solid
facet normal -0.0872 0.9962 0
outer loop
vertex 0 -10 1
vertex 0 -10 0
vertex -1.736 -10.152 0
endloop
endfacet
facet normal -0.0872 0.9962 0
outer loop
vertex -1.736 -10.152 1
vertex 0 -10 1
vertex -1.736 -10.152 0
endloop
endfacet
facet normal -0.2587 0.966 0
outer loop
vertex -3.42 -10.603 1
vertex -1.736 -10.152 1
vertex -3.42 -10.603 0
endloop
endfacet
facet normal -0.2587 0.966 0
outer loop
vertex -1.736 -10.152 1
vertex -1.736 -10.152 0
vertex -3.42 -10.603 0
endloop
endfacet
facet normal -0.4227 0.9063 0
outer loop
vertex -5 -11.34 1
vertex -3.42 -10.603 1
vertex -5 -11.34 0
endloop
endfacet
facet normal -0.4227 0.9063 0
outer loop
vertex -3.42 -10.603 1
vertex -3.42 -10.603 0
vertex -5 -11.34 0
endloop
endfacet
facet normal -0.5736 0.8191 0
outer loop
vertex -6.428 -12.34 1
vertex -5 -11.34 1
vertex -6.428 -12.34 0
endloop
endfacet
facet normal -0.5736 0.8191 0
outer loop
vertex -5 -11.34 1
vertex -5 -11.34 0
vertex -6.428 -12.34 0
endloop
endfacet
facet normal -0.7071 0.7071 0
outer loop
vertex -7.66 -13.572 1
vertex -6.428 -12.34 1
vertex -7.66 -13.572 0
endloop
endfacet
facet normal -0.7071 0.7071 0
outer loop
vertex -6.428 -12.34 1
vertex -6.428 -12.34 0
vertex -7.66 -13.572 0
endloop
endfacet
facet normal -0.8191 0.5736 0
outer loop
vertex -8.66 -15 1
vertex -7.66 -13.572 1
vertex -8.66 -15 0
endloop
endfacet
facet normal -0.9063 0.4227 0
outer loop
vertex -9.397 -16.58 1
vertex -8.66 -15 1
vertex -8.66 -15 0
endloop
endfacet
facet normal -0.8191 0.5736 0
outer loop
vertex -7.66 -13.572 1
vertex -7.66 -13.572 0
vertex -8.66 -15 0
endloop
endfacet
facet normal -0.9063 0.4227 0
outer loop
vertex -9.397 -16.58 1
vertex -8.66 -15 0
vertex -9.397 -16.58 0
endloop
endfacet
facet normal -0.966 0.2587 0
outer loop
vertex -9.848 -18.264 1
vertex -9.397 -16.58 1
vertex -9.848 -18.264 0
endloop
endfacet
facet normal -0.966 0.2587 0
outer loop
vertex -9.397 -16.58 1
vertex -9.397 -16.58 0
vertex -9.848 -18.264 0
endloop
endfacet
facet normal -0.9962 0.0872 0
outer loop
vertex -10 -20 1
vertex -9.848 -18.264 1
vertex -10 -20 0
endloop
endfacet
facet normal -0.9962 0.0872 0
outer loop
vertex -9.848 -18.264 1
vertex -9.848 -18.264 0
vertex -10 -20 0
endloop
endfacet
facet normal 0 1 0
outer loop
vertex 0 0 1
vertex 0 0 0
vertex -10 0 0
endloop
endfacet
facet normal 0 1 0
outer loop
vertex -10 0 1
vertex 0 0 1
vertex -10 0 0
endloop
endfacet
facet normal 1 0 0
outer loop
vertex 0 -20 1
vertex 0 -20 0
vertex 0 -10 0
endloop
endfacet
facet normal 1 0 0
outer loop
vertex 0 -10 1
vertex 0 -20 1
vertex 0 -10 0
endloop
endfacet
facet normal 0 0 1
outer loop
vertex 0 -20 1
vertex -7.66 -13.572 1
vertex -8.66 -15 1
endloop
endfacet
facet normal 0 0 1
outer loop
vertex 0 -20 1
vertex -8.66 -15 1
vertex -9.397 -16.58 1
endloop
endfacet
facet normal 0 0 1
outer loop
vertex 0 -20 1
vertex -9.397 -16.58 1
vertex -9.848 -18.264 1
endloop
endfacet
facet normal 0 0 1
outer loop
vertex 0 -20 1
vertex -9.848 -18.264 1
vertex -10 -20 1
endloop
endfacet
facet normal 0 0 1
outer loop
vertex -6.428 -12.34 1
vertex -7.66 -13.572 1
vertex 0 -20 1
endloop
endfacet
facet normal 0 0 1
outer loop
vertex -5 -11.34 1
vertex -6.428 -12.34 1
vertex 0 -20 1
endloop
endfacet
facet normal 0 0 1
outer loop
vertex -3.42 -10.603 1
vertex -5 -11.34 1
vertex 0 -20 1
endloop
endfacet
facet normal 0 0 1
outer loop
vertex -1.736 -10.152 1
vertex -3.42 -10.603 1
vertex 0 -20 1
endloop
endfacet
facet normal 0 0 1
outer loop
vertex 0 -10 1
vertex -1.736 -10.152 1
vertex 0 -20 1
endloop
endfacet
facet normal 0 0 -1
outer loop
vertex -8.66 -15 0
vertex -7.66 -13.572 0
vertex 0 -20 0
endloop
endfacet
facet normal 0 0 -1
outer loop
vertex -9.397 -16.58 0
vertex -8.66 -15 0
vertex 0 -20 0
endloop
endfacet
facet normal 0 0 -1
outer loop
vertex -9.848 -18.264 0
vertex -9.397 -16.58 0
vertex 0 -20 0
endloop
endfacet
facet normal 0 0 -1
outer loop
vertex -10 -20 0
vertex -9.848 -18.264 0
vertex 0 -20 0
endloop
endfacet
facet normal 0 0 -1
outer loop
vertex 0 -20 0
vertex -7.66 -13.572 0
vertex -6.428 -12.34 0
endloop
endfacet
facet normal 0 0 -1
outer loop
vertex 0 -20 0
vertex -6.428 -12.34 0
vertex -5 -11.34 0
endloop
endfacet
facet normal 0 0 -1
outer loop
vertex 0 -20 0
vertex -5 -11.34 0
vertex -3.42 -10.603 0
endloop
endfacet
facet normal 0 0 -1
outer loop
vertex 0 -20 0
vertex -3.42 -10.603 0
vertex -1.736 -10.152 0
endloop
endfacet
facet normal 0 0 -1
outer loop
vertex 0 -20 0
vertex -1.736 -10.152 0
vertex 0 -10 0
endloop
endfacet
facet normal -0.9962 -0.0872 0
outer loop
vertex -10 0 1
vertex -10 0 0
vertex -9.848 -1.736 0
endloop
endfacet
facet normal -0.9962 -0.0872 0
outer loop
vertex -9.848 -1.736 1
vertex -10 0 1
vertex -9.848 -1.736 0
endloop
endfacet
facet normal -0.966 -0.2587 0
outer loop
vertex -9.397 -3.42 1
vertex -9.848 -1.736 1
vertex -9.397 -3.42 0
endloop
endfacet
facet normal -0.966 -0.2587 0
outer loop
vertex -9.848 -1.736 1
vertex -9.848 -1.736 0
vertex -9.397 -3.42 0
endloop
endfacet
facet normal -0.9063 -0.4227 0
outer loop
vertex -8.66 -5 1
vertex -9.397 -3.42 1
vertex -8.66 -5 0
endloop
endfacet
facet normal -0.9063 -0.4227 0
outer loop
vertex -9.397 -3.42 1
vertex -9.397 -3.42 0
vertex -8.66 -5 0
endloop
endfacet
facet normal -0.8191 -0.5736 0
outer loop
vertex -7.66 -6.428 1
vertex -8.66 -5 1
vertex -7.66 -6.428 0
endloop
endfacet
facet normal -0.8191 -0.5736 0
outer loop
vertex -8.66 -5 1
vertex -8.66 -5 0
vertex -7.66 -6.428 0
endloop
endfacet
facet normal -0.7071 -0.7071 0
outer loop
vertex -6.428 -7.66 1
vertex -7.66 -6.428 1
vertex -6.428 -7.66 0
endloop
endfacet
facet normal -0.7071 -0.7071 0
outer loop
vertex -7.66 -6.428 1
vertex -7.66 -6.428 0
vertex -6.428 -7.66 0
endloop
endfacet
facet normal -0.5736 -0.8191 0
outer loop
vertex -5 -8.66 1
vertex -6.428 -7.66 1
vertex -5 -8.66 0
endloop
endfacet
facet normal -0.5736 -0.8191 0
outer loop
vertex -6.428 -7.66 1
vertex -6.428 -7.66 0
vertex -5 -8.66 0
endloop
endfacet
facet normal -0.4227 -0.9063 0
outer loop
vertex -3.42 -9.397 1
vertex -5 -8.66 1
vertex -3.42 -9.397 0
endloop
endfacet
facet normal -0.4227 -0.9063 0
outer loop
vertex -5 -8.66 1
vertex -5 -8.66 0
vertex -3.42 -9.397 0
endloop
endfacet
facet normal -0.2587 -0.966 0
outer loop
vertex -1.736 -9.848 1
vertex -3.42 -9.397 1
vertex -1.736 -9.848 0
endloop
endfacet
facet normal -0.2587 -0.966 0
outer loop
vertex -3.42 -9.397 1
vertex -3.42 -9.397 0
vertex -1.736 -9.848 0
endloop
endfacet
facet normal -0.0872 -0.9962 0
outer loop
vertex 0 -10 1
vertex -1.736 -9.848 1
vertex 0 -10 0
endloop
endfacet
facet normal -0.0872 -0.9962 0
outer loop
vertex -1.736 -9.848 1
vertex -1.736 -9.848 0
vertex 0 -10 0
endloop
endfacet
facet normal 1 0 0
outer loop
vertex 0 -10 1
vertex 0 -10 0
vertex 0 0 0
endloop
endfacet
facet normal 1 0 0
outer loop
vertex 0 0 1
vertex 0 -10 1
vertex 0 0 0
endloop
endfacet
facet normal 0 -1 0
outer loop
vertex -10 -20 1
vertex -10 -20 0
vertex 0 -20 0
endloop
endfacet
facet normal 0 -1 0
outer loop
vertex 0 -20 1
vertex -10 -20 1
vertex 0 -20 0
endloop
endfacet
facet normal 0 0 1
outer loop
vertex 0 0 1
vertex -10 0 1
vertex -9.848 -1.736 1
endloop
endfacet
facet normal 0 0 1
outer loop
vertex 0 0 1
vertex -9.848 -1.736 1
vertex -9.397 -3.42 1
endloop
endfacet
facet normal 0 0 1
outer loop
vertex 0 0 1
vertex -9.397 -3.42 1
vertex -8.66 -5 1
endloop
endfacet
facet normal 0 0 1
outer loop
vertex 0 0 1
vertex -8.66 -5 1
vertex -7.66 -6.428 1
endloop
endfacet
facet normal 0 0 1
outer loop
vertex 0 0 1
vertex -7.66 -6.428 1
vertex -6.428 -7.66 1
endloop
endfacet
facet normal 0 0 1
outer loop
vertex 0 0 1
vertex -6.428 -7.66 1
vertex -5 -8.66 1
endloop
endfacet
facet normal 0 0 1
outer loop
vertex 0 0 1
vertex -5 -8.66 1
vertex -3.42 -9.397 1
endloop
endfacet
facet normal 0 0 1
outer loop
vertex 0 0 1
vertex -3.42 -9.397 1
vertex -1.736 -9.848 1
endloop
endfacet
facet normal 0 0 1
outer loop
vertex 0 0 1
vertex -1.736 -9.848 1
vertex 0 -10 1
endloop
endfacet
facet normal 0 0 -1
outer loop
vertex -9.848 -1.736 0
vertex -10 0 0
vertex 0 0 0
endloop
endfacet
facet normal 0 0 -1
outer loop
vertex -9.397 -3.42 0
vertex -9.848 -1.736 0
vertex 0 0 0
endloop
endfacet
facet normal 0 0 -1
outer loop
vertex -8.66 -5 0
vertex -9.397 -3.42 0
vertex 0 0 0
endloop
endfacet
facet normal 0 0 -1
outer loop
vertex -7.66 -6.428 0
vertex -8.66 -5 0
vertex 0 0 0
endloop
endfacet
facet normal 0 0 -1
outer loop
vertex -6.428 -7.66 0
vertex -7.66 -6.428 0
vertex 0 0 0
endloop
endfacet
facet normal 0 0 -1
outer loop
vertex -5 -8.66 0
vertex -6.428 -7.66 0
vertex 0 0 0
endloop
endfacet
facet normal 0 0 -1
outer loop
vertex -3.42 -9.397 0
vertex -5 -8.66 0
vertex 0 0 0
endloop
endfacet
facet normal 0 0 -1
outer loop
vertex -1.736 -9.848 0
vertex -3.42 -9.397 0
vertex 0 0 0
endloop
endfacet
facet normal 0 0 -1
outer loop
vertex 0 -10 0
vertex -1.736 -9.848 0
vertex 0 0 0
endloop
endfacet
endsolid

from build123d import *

# Parameters (mm, degrees)
EXTRUDE_1_DEPTH   = 1
EXTRUDE_1_2_DEPTH = 1


with BuildPart() as part:
    # ｽｹｯﾁ1 → ﾎﾞｽ - 押し出し1 (new body)
    with BuildSketch(Plane.XY):
        with BuildLine():
            Line((0, -10), (0, 0))
            Line((0, 0), (-10, 0))
            ThreePointArc((-10, 0), (-7.071067812, -7.071067812), (0, -10))
        make_face()
    extrude(amount=EXTRUDE_1_DEPTH)


with BuildPart() as body_2:
    # ｽｹｯﾁ1 → Extrude 1 2 (new body)
    with BuildSketch(Plane.XY):
        with BuildLine():
            Line((0, -20), (0, -10))
            ThreePointArc((0, -10), (-7.071067812, -12.928932188), (-10, -20))
            Line((-10, -20), (0, -20))
        make_face()
    extrude(amount=EXTRUDE_1_2_DEPTH)


solid = Compound([part.part, body_2.part])
